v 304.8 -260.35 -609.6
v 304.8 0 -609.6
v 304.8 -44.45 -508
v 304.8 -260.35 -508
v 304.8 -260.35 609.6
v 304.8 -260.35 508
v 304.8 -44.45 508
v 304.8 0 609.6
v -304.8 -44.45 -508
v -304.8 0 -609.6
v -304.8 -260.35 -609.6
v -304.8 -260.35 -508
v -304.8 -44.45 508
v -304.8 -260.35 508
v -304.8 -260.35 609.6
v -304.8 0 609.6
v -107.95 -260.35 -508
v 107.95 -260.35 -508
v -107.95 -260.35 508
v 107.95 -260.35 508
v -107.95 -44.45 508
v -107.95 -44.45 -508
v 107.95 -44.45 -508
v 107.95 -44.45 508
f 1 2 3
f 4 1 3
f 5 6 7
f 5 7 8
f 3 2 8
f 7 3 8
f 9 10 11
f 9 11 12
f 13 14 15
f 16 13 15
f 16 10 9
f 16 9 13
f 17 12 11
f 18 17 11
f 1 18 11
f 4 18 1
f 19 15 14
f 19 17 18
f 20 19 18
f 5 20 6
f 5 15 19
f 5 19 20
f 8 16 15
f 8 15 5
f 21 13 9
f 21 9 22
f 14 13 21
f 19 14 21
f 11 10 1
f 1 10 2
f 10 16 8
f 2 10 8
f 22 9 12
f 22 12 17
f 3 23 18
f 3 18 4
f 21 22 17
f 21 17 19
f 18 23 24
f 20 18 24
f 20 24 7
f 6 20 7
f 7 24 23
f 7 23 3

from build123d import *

# Parameters (mm, degrees)
F0_W     = 609.6
F0_H     = 1219.2
F1_DEPTH = 44.45
F2_W     = 609.6
F2_H     = 101.6
F3_DEPTH = 215.9
F4_W     = 215.9
F4_H     = 1016
F5_DEPTH = 260.35


with BuildPart() as f1:
    # F0 (on Front) → F1 (new body)
    with BuildSketch(Plane.XZ):
        Rectangle(F0_W, F0_H)
    extrude(amount=F1_DEPTH)

    # F2 (on face) → F3 (join)
    with BuildSketch(Plane.XZ.offset(44.45)):
        with Locations((0, 558.8)):
            Rectangle(F2_W, F2_H)
        with Locations((0, -558.8)):
            Rectangle(F2_W, F2_H)
    extrude(amount=F3_DEPTH)

    # F4 (on Front) → F5 (join)
    with BuildSketch(Plane.XZ):
        Rectangle(F4_W, F4_H)
    extrude(amount=F5_DEPTH)


solid = f1.part
